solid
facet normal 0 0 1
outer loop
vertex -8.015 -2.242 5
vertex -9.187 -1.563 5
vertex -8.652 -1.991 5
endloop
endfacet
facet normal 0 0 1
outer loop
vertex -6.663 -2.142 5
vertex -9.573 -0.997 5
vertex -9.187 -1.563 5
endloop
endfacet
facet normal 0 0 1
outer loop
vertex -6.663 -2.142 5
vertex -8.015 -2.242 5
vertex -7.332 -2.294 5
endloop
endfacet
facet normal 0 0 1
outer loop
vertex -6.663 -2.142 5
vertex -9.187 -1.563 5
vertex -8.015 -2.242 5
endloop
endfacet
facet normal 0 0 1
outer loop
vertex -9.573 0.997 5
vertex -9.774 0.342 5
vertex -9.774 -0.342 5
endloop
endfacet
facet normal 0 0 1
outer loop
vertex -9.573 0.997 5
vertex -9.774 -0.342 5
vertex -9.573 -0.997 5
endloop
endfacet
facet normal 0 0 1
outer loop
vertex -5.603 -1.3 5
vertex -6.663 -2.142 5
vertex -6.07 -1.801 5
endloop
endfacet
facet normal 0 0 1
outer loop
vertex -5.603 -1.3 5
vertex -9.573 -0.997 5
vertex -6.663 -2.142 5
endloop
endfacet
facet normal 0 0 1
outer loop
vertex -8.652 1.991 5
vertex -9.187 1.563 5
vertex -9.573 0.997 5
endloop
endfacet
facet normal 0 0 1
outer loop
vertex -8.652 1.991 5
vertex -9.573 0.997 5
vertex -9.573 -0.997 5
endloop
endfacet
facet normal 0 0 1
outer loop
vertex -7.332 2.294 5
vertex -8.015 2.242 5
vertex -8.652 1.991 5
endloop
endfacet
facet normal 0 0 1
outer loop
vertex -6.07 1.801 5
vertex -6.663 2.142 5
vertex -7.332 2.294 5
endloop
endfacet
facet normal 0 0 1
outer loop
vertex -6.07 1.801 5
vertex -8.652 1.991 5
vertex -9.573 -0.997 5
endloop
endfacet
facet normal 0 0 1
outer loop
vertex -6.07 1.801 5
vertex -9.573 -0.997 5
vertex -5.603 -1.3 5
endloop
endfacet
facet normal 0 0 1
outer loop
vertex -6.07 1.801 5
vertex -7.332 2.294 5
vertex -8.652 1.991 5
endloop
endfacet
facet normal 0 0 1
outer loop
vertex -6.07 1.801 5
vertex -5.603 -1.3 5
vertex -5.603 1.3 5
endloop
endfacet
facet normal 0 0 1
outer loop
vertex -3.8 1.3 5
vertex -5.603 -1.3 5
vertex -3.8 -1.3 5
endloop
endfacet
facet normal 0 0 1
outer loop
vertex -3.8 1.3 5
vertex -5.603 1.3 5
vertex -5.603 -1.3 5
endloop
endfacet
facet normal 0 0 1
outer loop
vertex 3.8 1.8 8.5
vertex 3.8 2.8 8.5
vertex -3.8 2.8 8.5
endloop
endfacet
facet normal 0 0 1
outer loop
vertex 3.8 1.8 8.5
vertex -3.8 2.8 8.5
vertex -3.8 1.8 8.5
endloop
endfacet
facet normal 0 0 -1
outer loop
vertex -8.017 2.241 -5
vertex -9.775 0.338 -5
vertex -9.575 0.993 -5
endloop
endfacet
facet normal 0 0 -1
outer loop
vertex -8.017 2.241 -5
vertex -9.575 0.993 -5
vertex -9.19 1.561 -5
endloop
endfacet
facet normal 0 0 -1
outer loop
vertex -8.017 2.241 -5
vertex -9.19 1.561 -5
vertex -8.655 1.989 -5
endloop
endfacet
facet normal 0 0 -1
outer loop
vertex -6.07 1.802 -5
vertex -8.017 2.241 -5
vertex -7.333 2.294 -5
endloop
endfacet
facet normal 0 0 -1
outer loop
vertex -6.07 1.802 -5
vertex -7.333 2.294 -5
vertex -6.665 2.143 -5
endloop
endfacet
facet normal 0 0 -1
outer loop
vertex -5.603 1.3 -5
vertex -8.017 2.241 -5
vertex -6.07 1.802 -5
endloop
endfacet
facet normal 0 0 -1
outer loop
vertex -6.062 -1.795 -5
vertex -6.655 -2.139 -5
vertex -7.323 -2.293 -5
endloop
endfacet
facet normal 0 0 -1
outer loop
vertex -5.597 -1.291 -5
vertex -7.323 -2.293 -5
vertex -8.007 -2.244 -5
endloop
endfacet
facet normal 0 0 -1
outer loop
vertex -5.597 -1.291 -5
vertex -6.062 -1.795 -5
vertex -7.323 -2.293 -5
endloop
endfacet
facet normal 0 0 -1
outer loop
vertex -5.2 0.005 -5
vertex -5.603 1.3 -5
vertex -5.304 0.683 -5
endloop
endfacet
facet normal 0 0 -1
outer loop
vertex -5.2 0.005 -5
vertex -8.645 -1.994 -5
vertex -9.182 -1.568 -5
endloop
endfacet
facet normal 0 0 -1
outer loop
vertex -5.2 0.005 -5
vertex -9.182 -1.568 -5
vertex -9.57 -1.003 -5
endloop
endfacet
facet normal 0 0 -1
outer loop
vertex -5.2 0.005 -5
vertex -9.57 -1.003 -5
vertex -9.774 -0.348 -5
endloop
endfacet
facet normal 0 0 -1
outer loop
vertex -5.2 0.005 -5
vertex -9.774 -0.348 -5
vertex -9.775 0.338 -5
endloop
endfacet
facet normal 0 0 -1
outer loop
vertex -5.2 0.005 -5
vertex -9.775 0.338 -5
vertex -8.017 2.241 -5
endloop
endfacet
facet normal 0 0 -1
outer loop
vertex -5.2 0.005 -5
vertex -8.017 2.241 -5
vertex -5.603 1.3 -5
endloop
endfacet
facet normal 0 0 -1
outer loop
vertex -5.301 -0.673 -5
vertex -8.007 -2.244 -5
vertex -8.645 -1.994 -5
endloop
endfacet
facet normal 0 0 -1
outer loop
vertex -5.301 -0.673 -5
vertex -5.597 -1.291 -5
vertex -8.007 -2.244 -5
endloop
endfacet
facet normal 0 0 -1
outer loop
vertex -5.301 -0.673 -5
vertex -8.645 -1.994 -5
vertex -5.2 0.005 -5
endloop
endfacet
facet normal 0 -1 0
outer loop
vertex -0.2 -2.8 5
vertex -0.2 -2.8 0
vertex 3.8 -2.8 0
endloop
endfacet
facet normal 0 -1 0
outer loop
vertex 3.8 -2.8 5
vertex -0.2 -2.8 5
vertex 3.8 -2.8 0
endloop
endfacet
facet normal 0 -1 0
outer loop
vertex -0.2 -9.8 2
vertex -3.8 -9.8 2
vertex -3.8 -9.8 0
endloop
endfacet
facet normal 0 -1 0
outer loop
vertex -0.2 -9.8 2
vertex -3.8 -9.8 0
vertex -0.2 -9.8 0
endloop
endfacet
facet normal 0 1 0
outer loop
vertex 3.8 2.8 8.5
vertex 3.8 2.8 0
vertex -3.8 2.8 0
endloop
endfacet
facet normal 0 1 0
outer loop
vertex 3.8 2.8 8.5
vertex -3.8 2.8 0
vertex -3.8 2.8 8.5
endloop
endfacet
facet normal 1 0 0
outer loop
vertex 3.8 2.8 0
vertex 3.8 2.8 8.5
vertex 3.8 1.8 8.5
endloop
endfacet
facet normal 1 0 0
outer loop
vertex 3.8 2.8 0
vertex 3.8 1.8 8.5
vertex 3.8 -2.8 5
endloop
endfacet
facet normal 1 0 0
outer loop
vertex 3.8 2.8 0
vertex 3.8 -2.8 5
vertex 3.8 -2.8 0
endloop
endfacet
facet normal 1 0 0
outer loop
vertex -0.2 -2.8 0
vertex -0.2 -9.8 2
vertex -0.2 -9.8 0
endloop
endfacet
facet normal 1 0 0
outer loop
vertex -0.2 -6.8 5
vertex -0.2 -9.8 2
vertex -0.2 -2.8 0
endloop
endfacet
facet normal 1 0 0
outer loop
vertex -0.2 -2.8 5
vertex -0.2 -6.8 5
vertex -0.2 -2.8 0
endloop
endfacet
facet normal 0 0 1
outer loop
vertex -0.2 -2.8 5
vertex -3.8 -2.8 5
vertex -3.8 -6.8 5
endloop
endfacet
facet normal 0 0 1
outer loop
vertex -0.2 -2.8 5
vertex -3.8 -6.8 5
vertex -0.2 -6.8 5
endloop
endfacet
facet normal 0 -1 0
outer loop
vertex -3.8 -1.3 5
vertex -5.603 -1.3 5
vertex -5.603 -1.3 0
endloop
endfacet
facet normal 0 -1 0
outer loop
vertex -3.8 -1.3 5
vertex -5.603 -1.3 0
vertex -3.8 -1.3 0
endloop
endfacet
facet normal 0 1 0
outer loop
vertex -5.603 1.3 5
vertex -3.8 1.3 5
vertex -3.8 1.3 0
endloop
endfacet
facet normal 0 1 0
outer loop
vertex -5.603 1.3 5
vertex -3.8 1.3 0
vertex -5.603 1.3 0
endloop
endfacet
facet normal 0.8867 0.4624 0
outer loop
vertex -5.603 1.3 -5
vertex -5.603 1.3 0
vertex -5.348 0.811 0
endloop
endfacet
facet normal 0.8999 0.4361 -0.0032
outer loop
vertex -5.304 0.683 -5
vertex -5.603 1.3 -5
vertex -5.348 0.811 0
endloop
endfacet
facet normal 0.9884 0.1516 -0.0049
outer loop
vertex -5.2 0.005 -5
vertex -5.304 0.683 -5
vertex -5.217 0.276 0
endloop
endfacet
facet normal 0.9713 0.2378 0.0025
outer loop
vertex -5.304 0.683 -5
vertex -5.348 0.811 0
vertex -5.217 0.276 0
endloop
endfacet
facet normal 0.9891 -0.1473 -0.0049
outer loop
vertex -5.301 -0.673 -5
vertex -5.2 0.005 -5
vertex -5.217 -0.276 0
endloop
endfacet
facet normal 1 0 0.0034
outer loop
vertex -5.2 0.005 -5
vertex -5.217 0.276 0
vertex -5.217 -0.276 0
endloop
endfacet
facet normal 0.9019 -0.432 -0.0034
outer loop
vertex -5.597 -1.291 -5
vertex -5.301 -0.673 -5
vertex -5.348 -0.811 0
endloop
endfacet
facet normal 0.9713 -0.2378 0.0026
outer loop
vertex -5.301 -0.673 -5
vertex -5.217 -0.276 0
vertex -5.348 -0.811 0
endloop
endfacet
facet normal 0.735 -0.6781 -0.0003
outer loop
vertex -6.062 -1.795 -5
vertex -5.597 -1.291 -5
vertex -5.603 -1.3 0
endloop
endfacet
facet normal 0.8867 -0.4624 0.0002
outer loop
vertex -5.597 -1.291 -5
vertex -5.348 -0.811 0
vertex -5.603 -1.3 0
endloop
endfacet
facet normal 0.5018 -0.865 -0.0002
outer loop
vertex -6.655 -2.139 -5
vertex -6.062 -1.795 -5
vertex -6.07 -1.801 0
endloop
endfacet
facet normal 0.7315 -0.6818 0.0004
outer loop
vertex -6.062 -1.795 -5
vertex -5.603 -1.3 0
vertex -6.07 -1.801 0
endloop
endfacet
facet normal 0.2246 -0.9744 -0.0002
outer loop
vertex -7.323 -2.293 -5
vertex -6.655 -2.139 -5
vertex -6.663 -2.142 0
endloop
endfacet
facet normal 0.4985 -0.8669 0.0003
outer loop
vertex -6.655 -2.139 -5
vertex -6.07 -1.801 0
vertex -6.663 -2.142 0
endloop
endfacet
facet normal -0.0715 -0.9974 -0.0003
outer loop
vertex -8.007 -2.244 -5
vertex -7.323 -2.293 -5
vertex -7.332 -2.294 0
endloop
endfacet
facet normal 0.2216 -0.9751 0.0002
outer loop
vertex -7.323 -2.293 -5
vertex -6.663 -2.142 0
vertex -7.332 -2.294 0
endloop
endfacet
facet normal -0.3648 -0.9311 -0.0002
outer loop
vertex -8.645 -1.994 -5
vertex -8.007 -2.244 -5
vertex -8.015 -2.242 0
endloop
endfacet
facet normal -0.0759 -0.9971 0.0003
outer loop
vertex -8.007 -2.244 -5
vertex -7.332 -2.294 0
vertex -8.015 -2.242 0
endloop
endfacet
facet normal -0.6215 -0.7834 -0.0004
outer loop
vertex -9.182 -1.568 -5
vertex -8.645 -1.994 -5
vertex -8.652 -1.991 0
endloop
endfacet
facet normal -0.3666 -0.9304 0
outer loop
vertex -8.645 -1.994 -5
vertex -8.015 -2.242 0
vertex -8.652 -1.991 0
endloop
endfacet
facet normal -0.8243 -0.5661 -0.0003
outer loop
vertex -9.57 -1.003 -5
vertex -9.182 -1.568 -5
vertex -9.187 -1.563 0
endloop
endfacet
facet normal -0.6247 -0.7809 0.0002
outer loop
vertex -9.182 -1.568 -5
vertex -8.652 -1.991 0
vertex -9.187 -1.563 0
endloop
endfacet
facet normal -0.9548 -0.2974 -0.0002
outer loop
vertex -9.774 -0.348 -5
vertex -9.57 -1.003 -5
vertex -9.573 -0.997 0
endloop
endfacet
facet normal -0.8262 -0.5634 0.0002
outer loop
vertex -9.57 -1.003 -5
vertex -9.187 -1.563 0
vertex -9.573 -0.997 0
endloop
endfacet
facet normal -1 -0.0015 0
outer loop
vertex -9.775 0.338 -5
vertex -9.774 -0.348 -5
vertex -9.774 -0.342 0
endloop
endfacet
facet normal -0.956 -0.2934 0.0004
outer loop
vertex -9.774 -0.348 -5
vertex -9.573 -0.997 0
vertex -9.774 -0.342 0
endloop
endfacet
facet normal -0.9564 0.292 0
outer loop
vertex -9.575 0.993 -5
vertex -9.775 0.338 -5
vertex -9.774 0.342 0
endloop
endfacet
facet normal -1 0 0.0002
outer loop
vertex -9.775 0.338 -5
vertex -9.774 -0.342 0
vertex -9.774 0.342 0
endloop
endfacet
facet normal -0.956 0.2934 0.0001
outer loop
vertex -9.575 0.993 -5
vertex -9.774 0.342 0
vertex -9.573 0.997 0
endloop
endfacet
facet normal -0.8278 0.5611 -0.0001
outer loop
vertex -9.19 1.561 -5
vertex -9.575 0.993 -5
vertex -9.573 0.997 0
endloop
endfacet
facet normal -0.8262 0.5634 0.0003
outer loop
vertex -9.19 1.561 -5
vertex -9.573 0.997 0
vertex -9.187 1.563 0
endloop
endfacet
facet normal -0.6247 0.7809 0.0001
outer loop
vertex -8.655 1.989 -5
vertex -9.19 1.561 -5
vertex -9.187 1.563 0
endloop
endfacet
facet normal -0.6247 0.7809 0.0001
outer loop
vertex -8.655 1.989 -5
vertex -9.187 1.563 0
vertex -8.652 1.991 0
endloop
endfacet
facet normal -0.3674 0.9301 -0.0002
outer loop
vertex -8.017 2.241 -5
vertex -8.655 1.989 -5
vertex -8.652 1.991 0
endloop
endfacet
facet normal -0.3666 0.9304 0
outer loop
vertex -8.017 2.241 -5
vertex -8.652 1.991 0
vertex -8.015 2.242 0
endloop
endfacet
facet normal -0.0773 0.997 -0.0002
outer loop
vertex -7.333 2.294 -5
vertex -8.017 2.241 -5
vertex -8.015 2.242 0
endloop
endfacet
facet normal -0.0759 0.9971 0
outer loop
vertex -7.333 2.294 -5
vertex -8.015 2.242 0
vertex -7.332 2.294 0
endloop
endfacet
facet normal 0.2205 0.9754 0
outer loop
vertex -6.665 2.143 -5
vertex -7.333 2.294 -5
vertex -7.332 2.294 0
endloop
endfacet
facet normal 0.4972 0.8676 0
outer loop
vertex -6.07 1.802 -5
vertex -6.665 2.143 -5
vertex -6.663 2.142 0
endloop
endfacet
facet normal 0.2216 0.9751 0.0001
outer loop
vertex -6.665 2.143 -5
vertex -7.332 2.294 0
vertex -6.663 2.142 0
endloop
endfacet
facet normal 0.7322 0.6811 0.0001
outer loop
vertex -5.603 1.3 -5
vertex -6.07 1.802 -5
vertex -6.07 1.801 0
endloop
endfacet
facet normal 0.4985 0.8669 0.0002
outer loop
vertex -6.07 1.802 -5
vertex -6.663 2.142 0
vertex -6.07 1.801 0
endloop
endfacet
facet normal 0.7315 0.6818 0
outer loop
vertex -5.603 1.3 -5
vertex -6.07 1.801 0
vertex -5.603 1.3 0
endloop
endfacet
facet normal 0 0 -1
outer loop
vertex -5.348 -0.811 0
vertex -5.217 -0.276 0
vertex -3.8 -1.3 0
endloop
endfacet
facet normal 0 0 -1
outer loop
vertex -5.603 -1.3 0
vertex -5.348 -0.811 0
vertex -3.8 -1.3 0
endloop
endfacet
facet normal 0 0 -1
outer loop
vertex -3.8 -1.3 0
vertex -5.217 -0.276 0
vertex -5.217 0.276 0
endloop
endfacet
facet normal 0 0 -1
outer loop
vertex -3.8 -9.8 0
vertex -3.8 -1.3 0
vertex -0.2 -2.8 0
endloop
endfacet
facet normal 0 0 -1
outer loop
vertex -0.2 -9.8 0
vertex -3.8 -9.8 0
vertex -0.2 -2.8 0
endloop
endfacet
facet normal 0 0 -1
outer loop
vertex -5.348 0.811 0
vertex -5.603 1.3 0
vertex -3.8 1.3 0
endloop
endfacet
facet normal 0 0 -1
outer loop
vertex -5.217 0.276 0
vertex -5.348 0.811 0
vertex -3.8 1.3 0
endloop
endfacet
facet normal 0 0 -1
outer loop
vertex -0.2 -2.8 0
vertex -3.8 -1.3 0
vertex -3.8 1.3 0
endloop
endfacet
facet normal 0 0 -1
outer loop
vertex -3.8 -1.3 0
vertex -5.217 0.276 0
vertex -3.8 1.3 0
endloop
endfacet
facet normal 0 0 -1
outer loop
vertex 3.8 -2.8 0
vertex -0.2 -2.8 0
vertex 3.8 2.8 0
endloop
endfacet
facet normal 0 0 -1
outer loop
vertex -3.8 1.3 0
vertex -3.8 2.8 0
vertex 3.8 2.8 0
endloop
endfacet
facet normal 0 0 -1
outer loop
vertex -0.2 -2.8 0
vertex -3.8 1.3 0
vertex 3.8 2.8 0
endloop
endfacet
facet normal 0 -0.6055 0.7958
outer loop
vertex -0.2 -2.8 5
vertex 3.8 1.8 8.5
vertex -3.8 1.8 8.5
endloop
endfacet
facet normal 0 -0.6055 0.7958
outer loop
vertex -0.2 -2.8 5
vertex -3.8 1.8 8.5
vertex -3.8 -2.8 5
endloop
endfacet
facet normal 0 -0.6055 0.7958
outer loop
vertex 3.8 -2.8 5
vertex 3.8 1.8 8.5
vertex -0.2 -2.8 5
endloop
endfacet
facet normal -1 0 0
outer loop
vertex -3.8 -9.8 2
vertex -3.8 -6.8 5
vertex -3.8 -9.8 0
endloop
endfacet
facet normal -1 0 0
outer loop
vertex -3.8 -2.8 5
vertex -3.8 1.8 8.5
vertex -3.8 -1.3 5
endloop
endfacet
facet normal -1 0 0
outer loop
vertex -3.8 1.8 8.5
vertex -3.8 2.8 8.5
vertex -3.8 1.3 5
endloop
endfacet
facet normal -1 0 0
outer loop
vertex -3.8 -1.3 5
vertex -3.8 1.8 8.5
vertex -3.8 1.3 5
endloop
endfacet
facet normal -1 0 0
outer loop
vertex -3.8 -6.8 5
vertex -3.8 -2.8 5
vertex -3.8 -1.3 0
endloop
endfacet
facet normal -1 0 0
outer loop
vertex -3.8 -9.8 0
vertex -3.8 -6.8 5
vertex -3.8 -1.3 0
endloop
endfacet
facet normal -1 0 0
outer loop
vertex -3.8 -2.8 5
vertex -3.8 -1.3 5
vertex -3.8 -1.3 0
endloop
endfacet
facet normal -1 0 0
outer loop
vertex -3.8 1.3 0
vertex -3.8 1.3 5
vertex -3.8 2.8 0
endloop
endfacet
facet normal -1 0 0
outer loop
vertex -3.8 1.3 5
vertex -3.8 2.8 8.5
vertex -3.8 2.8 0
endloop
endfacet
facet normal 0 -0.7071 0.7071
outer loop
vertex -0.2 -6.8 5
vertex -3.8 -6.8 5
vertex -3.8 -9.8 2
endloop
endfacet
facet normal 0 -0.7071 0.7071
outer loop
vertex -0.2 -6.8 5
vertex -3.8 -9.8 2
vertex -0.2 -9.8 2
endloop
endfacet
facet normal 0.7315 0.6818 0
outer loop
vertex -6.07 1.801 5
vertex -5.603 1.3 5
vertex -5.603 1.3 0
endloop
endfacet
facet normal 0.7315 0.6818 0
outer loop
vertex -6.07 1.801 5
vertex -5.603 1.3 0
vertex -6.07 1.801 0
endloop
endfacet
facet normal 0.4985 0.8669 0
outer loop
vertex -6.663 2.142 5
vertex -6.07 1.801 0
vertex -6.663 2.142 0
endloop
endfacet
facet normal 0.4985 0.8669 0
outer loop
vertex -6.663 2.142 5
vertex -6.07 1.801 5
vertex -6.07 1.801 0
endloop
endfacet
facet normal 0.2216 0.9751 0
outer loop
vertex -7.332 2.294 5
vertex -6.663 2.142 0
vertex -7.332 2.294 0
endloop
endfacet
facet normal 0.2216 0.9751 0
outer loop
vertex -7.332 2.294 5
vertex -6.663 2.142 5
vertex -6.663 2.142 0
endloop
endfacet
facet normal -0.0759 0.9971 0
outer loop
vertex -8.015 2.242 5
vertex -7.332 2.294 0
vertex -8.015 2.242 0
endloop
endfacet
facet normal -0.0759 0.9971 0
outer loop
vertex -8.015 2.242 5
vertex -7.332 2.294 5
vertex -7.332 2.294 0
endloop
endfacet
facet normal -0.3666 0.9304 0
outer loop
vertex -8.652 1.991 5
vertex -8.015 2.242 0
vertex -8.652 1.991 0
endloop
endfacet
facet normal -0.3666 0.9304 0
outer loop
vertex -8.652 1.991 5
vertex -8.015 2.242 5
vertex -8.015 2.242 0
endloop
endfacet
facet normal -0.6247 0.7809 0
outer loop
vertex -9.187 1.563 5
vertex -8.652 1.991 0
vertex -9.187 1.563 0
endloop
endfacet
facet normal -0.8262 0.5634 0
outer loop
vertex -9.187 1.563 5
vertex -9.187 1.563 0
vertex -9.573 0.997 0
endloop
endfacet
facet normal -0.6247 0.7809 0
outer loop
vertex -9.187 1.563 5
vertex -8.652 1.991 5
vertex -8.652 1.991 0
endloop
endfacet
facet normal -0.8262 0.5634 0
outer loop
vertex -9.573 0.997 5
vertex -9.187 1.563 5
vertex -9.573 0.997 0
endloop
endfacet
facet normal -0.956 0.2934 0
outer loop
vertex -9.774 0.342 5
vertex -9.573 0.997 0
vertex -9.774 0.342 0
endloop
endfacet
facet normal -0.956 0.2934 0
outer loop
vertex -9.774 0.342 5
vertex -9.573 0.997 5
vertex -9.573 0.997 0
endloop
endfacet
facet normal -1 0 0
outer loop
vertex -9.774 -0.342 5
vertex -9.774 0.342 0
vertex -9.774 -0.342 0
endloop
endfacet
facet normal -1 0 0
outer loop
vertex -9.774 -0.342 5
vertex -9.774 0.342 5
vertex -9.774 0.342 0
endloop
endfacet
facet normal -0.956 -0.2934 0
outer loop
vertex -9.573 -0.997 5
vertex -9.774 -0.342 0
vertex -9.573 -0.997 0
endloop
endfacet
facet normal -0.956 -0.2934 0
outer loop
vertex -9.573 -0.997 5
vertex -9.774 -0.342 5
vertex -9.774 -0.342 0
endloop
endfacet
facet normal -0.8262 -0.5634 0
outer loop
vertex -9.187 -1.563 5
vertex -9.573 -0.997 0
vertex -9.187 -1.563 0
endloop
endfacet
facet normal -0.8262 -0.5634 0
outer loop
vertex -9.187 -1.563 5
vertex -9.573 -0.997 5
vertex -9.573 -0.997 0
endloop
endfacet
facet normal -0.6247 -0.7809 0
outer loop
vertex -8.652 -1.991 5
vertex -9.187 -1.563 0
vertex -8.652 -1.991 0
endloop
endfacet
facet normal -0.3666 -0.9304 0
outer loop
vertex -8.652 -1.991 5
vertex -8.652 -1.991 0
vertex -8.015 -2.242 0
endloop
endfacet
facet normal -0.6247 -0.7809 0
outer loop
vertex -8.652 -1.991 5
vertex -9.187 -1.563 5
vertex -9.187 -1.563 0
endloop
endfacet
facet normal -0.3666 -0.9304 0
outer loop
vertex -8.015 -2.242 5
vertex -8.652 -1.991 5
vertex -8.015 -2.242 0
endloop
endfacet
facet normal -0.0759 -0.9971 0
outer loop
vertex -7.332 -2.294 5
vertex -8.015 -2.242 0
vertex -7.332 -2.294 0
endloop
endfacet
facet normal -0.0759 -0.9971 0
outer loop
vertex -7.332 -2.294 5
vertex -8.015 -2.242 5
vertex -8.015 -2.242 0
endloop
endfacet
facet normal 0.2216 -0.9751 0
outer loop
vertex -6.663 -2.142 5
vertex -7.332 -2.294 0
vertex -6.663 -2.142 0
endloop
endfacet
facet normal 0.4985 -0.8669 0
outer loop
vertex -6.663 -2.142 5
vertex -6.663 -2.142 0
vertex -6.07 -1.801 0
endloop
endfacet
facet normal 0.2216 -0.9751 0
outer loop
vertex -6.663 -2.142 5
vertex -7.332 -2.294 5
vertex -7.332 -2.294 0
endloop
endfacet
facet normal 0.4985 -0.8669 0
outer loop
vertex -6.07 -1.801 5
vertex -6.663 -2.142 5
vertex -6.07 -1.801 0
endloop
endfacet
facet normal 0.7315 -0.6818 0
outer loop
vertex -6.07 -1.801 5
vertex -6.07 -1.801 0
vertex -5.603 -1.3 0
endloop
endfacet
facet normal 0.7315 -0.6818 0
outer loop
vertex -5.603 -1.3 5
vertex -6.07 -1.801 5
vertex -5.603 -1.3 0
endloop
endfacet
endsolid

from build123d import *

# Parameters (mm, degrees)
SZKIC1_W                    = 7.6
SZKIC1_H                    = 5.6
DODANIE_WYCI_GNI_CIE1_DEPTH = 5
DODANIE_WYCI_GNI_CIE2_DEPTH = 5
SZKIC3_W                    = 3.6
SZKIC3_H                    = 7
DODANIE_WYCI_GNI_CIE3_DEPTH = 5
SZKIC4_R                    = 2.3
DODANIE_WYCI_GNI_CIE4_DEPTH = 5
SFAZOWANIE1_SIZE            = 3
DODANIE_WYCI_GNI_CIE5_DEPTH = 7.6


with BuildPart() as part:
    # Szkic1 → Dodanie-wyciągnięcie1 (new body)
    with BuildSketch(Plane.XY):
        Rectangle(SZKIC1_W, SZKIC1_H)
    extrude(amount=DODANIE_WYCI_GNI_CIE1_DEPTH)

    # Szkic2 → Dodanie-wyciągnięcie2 (add)
    with BuildSketch(Plane.XY.offset(5)):
        with BuildLine():
            Line((-6.955089184, -1.3), (-6.955089184, 1.3))
            Line((-6.955089184, 1.3), (-5.602633404, 1.3))
            ThreePointArc((-5.602633404, 1.3), (-9.8, 0), (-5.602633404, -1.3))
            Line((-5.602633404, -1.3), (-6.955089184, -1.3))
        make_face()
        with BuildLine():
            Line((-5.602633404, 1.3), (-6.955089184, 1.3))
            Line((-6.955089184, 1.3), (-6.955089184, -1.3))
            Line((-6.955089184, -1.3), (-5.602633404, -1.3))
            ThreePointArc((-5.602633404, -1.3), (-5.302962999, -0.680461913), (-5.2, 0))
            ThreePointArc((-5.2, 0), (-5.302962999, 0.680461913), (-5.602633404, 1.3))
        make_face()
        with BuildLine():
            Line((-3.8, 1.3), (-5.602633404, 1.3))
            ThreePointArc((-5.602633404, 1.3), (-5.302962999, 0.680461913), (-5.2, 0))
            ThreePointArc((-5.2, 0), (-5.302962999, -0.680461913), (-5.602633404, -1.3))
            Line((-5.602633404, -1.3), (-3.8, -1.3))
            Line((-3.8, -1.3), (-3.8, 1.3))
        make_face()
    extrude(amount=-DODANIE_WYCI_GNI_CIE2_DEPTH)

    # Szkic3 → Dodanie-wyciągnięcie3 (add)
    with BuildSketch(Plane.XY.offset(5)):
        with Locations((-2, -6.3)):
            Rectangle(SZKIC3_W, SZKIC3_H)
    extrude(amount=-DODANIE_WYCI_GNI_CIE3_DEPTH)

    # Szkic4 → Dodanie-wyciągnięcie4 (add)
    with BuildSketch(Plane(origin=(0, 0, 0), x_dir=(-1, 0, 0), z_dir=(0, 0, -1))):
        with Locations(Location((7.5, 0, 0), (0, 0, 145.58261129))):
            Circle(SZKIC4_R)
    extrude(amount=DODANIE_WYCI_GNI_CIE4_DEPTH)

    # Sfazowanie1
    sfazowanie1_edges = [part.edges().sort_by_distance(p)[0] for p in [
        (-2, -9.8, 5),
    ]]
    chamfer(sfazowanie1_edges, length=SFAZOWANIE1_SIZE)

    # Szkic5 → Dodanie-wyciągnięcie5 (add)
    with BuildSketch(Plane(origin=(3.8, 0, 0), x_dir=(0, 0, -1), z_dir=(1, 0, 0))):
        Polygon((-5, 2.8), (-8.5, 2.8), (-8.5, 1.8), (-5, -2.8), align=None)
    extrude(amount=-DODANIE_WYCI_GNI_CIE5_DEPTH)


solid = part.part
